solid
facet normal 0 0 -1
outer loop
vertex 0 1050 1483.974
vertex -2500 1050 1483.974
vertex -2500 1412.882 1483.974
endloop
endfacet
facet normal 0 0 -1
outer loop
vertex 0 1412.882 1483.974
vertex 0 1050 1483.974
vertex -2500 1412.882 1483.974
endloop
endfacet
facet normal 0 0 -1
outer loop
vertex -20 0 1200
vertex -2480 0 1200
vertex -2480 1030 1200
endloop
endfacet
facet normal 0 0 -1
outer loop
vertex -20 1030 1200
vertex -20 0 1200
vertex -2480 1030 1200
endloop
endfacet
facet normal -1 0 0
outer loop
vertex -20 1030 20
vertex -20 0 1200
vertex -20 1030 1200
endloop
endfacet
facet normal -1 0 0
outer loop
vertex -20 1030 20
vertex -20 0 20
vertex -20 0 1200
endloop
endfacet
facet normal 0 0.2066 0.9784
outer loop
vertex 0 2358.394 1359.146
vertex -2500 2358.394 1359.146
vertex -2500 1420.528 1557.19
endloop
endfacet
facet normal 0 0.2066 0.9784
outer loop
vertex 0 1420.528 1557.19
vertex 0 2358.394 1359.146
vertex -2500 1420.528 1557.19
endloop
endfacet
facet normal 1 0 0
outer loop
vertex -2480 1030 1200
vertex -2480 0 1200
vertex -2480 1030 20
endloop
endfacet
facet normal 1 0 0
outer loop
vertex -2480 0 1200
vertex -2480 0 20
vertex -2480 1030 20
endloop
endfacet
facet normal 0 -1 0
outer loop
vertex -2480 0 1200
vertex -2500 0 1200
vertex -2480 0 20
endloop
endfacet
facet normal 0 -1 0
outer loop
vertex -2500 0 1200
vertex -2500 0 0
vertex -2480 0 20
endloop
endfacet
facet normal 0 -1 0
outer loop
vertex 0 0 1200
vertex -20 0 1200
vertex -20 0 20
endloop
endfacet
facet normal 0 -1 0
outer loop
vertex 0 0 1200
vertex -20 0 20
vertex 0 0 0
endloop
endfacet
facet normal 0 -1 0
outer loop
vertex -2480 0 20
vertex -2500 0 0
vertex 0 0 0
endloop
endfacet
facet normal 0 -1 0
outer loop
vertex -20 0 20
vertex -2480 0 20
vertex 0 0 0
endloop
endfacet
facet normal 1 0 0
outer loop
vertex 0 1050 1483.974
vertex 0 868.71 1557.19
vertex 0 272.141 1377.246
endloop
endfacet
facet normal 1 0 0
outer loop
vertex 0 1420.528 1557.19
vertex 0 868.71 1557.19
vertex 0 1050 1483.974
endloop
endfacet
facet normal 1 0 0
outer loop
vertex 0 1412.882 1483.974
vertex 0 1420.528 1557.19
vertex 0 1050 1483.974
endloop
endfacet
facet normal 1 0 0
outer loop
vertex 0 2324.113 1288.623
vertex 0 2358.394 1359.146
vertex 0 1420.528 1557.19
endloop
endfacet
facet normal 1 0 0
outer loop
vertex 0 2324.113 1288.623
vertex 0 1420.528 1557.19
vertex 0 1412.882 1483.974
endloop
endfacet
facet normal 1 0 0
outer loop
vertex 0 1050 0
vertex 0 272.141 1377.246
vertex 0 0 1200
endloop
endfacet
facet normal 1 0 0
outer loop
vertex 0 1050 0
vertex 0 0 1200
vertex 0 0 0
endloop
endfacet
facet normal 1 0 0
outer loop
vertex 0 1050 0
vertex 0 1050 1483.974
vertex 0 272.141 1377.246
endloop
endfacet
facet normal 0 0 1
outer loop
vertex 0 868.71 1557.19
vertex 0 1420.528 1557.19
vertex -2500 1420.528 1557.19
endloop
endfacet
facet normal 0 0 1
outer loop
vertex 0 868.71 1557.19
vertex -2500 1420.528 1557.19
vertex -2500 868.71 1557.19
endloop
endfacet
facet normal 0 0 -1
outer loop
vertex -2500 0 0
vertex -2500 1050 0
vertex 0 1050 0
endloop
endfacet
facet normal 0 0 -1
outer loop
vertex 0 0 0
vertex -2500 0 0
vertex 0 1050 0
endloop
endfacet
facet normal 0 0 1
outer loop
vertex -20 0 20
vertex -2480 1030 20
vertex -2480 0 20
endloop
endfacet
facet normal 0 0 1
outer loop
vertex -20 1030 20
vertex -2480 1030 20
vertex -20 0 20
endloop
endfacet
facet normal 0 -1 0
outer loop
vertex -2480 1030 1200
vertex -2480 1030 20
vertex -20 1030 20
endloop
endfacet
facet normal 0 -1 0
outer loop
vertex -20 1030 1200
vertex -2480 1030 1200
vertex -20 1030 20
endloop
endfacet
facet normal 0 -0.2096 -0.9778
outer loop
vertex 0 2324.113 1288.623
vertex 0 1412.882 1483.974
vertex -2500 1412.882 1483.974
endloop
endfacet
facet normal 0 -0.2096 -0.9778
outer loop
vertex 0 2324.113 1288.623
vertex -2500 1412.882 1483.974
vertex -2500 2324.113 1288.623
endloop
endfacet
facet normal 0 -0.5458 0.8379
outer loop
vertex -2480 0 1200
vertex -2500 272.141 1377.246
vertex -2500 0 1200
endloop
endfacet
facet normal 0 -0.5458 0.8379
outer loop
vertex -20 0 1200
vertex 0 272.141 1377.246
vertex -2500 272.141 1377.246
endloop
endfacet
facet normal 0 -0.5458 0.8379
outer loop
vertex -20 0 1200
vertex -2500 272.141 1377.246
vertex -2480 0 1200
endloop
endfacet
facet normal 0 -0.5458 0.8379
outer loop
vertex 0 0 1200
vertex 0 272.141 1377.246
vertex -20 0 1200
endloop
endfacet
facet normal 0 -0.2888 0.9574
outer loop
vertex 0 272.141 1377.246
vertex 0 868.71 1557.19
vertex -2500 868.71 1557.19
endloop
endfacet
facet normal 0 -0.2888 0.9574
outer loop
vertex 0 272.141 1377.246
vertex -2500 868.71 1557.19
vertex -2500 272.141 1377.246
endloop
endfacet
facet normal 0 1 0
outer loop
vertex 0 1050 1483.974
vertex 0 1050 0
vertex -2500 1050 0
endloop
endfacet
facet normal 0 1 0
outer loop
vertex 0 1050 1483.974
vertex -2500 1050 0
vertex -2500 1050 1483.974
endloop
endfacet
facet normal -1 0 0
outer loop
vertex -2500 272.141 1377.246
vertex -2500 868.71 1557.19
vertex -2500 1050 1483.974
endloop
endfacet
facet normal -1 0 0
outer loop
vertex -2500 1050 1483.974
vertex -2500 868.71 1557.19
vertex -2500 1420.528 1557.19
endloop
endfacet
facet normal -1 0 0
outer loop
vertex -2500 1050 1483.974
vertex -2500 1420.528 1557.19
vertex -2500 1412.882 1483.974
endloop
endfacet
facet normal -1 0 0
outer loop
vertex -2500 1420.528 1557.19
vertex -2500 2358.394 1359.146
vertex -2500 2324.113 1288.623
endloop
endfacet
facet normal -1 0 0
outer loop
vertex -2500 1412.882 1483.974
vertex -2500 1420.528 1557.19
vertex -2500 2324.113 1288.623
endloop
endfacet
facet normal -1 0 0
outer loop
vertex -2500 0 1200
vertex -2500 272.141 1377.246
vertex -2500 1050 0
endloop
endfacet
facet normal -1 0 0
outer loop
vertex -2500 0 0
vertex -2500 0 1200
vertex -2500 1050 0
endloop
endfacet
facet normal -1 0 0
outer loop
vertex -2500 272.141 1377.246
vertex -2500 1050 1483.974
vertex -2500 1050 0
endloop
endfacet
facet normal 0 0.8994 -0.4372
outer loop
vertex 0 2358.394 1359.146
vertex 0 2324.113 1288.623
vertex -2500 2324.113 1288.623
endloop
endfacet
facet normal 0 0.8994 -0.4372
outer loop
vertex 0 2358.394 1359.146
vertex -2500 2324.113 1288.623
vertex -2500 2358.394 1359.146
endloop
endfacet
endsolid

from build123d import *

# Parameters (mm, degrees)
SKETCH1_W           = 2500
SKETCH1_H           = 1050
BOSS_EXTRUDE1_DEPTH = 1200
SHELL2_T            = -20
BOSS_EXTRUDE2_DEPTH = 2500


with BuildPart() as part:
    # Sketch1 → Boss-Extrude1 (new body)
    with BuildSketch(Plane.XY):
        with Locations((-1250, 525)):
            Rectangle(SKETCH1_W, SKETCH1_H)
    extrude(amount=BOSS_EXTRUDE1_DEPTH)

    # Shell2
    shell2_openings = [part.faces().sort_by_distance(p)[0] for p in [
        (-1250, 525, 1200),
        (-1250, 0, 600),
    ]]
    offset(amount=SHELL2_T, openings=shell2_openings, kind=Kind.INTERSECTION)

    # Sketch2 → Boss-Extrude2 (add)
    with BuildSketch(Plane(origin=(0, 0, 0), x_dir=(0, 0, -1), z_dir=(1, 0, 0))):
        Polygon((-1200, 1050), (-1483.973725, 1050), (-1483.973725, 1412.881782165), (-1288.623152026, 2324.113117687), (-1359.145547993, 2358.393756698), (-1557.190049739, 1420.527840387), (-1557.190049739, 1050), (-1557.190049739, 868.710221607), (-1377.246304053, 272.141248376), (-1200, 0), align=None)
    extrude(amount=-BOSS_EXTRUDE2_DEPTH)


solid = part.part
